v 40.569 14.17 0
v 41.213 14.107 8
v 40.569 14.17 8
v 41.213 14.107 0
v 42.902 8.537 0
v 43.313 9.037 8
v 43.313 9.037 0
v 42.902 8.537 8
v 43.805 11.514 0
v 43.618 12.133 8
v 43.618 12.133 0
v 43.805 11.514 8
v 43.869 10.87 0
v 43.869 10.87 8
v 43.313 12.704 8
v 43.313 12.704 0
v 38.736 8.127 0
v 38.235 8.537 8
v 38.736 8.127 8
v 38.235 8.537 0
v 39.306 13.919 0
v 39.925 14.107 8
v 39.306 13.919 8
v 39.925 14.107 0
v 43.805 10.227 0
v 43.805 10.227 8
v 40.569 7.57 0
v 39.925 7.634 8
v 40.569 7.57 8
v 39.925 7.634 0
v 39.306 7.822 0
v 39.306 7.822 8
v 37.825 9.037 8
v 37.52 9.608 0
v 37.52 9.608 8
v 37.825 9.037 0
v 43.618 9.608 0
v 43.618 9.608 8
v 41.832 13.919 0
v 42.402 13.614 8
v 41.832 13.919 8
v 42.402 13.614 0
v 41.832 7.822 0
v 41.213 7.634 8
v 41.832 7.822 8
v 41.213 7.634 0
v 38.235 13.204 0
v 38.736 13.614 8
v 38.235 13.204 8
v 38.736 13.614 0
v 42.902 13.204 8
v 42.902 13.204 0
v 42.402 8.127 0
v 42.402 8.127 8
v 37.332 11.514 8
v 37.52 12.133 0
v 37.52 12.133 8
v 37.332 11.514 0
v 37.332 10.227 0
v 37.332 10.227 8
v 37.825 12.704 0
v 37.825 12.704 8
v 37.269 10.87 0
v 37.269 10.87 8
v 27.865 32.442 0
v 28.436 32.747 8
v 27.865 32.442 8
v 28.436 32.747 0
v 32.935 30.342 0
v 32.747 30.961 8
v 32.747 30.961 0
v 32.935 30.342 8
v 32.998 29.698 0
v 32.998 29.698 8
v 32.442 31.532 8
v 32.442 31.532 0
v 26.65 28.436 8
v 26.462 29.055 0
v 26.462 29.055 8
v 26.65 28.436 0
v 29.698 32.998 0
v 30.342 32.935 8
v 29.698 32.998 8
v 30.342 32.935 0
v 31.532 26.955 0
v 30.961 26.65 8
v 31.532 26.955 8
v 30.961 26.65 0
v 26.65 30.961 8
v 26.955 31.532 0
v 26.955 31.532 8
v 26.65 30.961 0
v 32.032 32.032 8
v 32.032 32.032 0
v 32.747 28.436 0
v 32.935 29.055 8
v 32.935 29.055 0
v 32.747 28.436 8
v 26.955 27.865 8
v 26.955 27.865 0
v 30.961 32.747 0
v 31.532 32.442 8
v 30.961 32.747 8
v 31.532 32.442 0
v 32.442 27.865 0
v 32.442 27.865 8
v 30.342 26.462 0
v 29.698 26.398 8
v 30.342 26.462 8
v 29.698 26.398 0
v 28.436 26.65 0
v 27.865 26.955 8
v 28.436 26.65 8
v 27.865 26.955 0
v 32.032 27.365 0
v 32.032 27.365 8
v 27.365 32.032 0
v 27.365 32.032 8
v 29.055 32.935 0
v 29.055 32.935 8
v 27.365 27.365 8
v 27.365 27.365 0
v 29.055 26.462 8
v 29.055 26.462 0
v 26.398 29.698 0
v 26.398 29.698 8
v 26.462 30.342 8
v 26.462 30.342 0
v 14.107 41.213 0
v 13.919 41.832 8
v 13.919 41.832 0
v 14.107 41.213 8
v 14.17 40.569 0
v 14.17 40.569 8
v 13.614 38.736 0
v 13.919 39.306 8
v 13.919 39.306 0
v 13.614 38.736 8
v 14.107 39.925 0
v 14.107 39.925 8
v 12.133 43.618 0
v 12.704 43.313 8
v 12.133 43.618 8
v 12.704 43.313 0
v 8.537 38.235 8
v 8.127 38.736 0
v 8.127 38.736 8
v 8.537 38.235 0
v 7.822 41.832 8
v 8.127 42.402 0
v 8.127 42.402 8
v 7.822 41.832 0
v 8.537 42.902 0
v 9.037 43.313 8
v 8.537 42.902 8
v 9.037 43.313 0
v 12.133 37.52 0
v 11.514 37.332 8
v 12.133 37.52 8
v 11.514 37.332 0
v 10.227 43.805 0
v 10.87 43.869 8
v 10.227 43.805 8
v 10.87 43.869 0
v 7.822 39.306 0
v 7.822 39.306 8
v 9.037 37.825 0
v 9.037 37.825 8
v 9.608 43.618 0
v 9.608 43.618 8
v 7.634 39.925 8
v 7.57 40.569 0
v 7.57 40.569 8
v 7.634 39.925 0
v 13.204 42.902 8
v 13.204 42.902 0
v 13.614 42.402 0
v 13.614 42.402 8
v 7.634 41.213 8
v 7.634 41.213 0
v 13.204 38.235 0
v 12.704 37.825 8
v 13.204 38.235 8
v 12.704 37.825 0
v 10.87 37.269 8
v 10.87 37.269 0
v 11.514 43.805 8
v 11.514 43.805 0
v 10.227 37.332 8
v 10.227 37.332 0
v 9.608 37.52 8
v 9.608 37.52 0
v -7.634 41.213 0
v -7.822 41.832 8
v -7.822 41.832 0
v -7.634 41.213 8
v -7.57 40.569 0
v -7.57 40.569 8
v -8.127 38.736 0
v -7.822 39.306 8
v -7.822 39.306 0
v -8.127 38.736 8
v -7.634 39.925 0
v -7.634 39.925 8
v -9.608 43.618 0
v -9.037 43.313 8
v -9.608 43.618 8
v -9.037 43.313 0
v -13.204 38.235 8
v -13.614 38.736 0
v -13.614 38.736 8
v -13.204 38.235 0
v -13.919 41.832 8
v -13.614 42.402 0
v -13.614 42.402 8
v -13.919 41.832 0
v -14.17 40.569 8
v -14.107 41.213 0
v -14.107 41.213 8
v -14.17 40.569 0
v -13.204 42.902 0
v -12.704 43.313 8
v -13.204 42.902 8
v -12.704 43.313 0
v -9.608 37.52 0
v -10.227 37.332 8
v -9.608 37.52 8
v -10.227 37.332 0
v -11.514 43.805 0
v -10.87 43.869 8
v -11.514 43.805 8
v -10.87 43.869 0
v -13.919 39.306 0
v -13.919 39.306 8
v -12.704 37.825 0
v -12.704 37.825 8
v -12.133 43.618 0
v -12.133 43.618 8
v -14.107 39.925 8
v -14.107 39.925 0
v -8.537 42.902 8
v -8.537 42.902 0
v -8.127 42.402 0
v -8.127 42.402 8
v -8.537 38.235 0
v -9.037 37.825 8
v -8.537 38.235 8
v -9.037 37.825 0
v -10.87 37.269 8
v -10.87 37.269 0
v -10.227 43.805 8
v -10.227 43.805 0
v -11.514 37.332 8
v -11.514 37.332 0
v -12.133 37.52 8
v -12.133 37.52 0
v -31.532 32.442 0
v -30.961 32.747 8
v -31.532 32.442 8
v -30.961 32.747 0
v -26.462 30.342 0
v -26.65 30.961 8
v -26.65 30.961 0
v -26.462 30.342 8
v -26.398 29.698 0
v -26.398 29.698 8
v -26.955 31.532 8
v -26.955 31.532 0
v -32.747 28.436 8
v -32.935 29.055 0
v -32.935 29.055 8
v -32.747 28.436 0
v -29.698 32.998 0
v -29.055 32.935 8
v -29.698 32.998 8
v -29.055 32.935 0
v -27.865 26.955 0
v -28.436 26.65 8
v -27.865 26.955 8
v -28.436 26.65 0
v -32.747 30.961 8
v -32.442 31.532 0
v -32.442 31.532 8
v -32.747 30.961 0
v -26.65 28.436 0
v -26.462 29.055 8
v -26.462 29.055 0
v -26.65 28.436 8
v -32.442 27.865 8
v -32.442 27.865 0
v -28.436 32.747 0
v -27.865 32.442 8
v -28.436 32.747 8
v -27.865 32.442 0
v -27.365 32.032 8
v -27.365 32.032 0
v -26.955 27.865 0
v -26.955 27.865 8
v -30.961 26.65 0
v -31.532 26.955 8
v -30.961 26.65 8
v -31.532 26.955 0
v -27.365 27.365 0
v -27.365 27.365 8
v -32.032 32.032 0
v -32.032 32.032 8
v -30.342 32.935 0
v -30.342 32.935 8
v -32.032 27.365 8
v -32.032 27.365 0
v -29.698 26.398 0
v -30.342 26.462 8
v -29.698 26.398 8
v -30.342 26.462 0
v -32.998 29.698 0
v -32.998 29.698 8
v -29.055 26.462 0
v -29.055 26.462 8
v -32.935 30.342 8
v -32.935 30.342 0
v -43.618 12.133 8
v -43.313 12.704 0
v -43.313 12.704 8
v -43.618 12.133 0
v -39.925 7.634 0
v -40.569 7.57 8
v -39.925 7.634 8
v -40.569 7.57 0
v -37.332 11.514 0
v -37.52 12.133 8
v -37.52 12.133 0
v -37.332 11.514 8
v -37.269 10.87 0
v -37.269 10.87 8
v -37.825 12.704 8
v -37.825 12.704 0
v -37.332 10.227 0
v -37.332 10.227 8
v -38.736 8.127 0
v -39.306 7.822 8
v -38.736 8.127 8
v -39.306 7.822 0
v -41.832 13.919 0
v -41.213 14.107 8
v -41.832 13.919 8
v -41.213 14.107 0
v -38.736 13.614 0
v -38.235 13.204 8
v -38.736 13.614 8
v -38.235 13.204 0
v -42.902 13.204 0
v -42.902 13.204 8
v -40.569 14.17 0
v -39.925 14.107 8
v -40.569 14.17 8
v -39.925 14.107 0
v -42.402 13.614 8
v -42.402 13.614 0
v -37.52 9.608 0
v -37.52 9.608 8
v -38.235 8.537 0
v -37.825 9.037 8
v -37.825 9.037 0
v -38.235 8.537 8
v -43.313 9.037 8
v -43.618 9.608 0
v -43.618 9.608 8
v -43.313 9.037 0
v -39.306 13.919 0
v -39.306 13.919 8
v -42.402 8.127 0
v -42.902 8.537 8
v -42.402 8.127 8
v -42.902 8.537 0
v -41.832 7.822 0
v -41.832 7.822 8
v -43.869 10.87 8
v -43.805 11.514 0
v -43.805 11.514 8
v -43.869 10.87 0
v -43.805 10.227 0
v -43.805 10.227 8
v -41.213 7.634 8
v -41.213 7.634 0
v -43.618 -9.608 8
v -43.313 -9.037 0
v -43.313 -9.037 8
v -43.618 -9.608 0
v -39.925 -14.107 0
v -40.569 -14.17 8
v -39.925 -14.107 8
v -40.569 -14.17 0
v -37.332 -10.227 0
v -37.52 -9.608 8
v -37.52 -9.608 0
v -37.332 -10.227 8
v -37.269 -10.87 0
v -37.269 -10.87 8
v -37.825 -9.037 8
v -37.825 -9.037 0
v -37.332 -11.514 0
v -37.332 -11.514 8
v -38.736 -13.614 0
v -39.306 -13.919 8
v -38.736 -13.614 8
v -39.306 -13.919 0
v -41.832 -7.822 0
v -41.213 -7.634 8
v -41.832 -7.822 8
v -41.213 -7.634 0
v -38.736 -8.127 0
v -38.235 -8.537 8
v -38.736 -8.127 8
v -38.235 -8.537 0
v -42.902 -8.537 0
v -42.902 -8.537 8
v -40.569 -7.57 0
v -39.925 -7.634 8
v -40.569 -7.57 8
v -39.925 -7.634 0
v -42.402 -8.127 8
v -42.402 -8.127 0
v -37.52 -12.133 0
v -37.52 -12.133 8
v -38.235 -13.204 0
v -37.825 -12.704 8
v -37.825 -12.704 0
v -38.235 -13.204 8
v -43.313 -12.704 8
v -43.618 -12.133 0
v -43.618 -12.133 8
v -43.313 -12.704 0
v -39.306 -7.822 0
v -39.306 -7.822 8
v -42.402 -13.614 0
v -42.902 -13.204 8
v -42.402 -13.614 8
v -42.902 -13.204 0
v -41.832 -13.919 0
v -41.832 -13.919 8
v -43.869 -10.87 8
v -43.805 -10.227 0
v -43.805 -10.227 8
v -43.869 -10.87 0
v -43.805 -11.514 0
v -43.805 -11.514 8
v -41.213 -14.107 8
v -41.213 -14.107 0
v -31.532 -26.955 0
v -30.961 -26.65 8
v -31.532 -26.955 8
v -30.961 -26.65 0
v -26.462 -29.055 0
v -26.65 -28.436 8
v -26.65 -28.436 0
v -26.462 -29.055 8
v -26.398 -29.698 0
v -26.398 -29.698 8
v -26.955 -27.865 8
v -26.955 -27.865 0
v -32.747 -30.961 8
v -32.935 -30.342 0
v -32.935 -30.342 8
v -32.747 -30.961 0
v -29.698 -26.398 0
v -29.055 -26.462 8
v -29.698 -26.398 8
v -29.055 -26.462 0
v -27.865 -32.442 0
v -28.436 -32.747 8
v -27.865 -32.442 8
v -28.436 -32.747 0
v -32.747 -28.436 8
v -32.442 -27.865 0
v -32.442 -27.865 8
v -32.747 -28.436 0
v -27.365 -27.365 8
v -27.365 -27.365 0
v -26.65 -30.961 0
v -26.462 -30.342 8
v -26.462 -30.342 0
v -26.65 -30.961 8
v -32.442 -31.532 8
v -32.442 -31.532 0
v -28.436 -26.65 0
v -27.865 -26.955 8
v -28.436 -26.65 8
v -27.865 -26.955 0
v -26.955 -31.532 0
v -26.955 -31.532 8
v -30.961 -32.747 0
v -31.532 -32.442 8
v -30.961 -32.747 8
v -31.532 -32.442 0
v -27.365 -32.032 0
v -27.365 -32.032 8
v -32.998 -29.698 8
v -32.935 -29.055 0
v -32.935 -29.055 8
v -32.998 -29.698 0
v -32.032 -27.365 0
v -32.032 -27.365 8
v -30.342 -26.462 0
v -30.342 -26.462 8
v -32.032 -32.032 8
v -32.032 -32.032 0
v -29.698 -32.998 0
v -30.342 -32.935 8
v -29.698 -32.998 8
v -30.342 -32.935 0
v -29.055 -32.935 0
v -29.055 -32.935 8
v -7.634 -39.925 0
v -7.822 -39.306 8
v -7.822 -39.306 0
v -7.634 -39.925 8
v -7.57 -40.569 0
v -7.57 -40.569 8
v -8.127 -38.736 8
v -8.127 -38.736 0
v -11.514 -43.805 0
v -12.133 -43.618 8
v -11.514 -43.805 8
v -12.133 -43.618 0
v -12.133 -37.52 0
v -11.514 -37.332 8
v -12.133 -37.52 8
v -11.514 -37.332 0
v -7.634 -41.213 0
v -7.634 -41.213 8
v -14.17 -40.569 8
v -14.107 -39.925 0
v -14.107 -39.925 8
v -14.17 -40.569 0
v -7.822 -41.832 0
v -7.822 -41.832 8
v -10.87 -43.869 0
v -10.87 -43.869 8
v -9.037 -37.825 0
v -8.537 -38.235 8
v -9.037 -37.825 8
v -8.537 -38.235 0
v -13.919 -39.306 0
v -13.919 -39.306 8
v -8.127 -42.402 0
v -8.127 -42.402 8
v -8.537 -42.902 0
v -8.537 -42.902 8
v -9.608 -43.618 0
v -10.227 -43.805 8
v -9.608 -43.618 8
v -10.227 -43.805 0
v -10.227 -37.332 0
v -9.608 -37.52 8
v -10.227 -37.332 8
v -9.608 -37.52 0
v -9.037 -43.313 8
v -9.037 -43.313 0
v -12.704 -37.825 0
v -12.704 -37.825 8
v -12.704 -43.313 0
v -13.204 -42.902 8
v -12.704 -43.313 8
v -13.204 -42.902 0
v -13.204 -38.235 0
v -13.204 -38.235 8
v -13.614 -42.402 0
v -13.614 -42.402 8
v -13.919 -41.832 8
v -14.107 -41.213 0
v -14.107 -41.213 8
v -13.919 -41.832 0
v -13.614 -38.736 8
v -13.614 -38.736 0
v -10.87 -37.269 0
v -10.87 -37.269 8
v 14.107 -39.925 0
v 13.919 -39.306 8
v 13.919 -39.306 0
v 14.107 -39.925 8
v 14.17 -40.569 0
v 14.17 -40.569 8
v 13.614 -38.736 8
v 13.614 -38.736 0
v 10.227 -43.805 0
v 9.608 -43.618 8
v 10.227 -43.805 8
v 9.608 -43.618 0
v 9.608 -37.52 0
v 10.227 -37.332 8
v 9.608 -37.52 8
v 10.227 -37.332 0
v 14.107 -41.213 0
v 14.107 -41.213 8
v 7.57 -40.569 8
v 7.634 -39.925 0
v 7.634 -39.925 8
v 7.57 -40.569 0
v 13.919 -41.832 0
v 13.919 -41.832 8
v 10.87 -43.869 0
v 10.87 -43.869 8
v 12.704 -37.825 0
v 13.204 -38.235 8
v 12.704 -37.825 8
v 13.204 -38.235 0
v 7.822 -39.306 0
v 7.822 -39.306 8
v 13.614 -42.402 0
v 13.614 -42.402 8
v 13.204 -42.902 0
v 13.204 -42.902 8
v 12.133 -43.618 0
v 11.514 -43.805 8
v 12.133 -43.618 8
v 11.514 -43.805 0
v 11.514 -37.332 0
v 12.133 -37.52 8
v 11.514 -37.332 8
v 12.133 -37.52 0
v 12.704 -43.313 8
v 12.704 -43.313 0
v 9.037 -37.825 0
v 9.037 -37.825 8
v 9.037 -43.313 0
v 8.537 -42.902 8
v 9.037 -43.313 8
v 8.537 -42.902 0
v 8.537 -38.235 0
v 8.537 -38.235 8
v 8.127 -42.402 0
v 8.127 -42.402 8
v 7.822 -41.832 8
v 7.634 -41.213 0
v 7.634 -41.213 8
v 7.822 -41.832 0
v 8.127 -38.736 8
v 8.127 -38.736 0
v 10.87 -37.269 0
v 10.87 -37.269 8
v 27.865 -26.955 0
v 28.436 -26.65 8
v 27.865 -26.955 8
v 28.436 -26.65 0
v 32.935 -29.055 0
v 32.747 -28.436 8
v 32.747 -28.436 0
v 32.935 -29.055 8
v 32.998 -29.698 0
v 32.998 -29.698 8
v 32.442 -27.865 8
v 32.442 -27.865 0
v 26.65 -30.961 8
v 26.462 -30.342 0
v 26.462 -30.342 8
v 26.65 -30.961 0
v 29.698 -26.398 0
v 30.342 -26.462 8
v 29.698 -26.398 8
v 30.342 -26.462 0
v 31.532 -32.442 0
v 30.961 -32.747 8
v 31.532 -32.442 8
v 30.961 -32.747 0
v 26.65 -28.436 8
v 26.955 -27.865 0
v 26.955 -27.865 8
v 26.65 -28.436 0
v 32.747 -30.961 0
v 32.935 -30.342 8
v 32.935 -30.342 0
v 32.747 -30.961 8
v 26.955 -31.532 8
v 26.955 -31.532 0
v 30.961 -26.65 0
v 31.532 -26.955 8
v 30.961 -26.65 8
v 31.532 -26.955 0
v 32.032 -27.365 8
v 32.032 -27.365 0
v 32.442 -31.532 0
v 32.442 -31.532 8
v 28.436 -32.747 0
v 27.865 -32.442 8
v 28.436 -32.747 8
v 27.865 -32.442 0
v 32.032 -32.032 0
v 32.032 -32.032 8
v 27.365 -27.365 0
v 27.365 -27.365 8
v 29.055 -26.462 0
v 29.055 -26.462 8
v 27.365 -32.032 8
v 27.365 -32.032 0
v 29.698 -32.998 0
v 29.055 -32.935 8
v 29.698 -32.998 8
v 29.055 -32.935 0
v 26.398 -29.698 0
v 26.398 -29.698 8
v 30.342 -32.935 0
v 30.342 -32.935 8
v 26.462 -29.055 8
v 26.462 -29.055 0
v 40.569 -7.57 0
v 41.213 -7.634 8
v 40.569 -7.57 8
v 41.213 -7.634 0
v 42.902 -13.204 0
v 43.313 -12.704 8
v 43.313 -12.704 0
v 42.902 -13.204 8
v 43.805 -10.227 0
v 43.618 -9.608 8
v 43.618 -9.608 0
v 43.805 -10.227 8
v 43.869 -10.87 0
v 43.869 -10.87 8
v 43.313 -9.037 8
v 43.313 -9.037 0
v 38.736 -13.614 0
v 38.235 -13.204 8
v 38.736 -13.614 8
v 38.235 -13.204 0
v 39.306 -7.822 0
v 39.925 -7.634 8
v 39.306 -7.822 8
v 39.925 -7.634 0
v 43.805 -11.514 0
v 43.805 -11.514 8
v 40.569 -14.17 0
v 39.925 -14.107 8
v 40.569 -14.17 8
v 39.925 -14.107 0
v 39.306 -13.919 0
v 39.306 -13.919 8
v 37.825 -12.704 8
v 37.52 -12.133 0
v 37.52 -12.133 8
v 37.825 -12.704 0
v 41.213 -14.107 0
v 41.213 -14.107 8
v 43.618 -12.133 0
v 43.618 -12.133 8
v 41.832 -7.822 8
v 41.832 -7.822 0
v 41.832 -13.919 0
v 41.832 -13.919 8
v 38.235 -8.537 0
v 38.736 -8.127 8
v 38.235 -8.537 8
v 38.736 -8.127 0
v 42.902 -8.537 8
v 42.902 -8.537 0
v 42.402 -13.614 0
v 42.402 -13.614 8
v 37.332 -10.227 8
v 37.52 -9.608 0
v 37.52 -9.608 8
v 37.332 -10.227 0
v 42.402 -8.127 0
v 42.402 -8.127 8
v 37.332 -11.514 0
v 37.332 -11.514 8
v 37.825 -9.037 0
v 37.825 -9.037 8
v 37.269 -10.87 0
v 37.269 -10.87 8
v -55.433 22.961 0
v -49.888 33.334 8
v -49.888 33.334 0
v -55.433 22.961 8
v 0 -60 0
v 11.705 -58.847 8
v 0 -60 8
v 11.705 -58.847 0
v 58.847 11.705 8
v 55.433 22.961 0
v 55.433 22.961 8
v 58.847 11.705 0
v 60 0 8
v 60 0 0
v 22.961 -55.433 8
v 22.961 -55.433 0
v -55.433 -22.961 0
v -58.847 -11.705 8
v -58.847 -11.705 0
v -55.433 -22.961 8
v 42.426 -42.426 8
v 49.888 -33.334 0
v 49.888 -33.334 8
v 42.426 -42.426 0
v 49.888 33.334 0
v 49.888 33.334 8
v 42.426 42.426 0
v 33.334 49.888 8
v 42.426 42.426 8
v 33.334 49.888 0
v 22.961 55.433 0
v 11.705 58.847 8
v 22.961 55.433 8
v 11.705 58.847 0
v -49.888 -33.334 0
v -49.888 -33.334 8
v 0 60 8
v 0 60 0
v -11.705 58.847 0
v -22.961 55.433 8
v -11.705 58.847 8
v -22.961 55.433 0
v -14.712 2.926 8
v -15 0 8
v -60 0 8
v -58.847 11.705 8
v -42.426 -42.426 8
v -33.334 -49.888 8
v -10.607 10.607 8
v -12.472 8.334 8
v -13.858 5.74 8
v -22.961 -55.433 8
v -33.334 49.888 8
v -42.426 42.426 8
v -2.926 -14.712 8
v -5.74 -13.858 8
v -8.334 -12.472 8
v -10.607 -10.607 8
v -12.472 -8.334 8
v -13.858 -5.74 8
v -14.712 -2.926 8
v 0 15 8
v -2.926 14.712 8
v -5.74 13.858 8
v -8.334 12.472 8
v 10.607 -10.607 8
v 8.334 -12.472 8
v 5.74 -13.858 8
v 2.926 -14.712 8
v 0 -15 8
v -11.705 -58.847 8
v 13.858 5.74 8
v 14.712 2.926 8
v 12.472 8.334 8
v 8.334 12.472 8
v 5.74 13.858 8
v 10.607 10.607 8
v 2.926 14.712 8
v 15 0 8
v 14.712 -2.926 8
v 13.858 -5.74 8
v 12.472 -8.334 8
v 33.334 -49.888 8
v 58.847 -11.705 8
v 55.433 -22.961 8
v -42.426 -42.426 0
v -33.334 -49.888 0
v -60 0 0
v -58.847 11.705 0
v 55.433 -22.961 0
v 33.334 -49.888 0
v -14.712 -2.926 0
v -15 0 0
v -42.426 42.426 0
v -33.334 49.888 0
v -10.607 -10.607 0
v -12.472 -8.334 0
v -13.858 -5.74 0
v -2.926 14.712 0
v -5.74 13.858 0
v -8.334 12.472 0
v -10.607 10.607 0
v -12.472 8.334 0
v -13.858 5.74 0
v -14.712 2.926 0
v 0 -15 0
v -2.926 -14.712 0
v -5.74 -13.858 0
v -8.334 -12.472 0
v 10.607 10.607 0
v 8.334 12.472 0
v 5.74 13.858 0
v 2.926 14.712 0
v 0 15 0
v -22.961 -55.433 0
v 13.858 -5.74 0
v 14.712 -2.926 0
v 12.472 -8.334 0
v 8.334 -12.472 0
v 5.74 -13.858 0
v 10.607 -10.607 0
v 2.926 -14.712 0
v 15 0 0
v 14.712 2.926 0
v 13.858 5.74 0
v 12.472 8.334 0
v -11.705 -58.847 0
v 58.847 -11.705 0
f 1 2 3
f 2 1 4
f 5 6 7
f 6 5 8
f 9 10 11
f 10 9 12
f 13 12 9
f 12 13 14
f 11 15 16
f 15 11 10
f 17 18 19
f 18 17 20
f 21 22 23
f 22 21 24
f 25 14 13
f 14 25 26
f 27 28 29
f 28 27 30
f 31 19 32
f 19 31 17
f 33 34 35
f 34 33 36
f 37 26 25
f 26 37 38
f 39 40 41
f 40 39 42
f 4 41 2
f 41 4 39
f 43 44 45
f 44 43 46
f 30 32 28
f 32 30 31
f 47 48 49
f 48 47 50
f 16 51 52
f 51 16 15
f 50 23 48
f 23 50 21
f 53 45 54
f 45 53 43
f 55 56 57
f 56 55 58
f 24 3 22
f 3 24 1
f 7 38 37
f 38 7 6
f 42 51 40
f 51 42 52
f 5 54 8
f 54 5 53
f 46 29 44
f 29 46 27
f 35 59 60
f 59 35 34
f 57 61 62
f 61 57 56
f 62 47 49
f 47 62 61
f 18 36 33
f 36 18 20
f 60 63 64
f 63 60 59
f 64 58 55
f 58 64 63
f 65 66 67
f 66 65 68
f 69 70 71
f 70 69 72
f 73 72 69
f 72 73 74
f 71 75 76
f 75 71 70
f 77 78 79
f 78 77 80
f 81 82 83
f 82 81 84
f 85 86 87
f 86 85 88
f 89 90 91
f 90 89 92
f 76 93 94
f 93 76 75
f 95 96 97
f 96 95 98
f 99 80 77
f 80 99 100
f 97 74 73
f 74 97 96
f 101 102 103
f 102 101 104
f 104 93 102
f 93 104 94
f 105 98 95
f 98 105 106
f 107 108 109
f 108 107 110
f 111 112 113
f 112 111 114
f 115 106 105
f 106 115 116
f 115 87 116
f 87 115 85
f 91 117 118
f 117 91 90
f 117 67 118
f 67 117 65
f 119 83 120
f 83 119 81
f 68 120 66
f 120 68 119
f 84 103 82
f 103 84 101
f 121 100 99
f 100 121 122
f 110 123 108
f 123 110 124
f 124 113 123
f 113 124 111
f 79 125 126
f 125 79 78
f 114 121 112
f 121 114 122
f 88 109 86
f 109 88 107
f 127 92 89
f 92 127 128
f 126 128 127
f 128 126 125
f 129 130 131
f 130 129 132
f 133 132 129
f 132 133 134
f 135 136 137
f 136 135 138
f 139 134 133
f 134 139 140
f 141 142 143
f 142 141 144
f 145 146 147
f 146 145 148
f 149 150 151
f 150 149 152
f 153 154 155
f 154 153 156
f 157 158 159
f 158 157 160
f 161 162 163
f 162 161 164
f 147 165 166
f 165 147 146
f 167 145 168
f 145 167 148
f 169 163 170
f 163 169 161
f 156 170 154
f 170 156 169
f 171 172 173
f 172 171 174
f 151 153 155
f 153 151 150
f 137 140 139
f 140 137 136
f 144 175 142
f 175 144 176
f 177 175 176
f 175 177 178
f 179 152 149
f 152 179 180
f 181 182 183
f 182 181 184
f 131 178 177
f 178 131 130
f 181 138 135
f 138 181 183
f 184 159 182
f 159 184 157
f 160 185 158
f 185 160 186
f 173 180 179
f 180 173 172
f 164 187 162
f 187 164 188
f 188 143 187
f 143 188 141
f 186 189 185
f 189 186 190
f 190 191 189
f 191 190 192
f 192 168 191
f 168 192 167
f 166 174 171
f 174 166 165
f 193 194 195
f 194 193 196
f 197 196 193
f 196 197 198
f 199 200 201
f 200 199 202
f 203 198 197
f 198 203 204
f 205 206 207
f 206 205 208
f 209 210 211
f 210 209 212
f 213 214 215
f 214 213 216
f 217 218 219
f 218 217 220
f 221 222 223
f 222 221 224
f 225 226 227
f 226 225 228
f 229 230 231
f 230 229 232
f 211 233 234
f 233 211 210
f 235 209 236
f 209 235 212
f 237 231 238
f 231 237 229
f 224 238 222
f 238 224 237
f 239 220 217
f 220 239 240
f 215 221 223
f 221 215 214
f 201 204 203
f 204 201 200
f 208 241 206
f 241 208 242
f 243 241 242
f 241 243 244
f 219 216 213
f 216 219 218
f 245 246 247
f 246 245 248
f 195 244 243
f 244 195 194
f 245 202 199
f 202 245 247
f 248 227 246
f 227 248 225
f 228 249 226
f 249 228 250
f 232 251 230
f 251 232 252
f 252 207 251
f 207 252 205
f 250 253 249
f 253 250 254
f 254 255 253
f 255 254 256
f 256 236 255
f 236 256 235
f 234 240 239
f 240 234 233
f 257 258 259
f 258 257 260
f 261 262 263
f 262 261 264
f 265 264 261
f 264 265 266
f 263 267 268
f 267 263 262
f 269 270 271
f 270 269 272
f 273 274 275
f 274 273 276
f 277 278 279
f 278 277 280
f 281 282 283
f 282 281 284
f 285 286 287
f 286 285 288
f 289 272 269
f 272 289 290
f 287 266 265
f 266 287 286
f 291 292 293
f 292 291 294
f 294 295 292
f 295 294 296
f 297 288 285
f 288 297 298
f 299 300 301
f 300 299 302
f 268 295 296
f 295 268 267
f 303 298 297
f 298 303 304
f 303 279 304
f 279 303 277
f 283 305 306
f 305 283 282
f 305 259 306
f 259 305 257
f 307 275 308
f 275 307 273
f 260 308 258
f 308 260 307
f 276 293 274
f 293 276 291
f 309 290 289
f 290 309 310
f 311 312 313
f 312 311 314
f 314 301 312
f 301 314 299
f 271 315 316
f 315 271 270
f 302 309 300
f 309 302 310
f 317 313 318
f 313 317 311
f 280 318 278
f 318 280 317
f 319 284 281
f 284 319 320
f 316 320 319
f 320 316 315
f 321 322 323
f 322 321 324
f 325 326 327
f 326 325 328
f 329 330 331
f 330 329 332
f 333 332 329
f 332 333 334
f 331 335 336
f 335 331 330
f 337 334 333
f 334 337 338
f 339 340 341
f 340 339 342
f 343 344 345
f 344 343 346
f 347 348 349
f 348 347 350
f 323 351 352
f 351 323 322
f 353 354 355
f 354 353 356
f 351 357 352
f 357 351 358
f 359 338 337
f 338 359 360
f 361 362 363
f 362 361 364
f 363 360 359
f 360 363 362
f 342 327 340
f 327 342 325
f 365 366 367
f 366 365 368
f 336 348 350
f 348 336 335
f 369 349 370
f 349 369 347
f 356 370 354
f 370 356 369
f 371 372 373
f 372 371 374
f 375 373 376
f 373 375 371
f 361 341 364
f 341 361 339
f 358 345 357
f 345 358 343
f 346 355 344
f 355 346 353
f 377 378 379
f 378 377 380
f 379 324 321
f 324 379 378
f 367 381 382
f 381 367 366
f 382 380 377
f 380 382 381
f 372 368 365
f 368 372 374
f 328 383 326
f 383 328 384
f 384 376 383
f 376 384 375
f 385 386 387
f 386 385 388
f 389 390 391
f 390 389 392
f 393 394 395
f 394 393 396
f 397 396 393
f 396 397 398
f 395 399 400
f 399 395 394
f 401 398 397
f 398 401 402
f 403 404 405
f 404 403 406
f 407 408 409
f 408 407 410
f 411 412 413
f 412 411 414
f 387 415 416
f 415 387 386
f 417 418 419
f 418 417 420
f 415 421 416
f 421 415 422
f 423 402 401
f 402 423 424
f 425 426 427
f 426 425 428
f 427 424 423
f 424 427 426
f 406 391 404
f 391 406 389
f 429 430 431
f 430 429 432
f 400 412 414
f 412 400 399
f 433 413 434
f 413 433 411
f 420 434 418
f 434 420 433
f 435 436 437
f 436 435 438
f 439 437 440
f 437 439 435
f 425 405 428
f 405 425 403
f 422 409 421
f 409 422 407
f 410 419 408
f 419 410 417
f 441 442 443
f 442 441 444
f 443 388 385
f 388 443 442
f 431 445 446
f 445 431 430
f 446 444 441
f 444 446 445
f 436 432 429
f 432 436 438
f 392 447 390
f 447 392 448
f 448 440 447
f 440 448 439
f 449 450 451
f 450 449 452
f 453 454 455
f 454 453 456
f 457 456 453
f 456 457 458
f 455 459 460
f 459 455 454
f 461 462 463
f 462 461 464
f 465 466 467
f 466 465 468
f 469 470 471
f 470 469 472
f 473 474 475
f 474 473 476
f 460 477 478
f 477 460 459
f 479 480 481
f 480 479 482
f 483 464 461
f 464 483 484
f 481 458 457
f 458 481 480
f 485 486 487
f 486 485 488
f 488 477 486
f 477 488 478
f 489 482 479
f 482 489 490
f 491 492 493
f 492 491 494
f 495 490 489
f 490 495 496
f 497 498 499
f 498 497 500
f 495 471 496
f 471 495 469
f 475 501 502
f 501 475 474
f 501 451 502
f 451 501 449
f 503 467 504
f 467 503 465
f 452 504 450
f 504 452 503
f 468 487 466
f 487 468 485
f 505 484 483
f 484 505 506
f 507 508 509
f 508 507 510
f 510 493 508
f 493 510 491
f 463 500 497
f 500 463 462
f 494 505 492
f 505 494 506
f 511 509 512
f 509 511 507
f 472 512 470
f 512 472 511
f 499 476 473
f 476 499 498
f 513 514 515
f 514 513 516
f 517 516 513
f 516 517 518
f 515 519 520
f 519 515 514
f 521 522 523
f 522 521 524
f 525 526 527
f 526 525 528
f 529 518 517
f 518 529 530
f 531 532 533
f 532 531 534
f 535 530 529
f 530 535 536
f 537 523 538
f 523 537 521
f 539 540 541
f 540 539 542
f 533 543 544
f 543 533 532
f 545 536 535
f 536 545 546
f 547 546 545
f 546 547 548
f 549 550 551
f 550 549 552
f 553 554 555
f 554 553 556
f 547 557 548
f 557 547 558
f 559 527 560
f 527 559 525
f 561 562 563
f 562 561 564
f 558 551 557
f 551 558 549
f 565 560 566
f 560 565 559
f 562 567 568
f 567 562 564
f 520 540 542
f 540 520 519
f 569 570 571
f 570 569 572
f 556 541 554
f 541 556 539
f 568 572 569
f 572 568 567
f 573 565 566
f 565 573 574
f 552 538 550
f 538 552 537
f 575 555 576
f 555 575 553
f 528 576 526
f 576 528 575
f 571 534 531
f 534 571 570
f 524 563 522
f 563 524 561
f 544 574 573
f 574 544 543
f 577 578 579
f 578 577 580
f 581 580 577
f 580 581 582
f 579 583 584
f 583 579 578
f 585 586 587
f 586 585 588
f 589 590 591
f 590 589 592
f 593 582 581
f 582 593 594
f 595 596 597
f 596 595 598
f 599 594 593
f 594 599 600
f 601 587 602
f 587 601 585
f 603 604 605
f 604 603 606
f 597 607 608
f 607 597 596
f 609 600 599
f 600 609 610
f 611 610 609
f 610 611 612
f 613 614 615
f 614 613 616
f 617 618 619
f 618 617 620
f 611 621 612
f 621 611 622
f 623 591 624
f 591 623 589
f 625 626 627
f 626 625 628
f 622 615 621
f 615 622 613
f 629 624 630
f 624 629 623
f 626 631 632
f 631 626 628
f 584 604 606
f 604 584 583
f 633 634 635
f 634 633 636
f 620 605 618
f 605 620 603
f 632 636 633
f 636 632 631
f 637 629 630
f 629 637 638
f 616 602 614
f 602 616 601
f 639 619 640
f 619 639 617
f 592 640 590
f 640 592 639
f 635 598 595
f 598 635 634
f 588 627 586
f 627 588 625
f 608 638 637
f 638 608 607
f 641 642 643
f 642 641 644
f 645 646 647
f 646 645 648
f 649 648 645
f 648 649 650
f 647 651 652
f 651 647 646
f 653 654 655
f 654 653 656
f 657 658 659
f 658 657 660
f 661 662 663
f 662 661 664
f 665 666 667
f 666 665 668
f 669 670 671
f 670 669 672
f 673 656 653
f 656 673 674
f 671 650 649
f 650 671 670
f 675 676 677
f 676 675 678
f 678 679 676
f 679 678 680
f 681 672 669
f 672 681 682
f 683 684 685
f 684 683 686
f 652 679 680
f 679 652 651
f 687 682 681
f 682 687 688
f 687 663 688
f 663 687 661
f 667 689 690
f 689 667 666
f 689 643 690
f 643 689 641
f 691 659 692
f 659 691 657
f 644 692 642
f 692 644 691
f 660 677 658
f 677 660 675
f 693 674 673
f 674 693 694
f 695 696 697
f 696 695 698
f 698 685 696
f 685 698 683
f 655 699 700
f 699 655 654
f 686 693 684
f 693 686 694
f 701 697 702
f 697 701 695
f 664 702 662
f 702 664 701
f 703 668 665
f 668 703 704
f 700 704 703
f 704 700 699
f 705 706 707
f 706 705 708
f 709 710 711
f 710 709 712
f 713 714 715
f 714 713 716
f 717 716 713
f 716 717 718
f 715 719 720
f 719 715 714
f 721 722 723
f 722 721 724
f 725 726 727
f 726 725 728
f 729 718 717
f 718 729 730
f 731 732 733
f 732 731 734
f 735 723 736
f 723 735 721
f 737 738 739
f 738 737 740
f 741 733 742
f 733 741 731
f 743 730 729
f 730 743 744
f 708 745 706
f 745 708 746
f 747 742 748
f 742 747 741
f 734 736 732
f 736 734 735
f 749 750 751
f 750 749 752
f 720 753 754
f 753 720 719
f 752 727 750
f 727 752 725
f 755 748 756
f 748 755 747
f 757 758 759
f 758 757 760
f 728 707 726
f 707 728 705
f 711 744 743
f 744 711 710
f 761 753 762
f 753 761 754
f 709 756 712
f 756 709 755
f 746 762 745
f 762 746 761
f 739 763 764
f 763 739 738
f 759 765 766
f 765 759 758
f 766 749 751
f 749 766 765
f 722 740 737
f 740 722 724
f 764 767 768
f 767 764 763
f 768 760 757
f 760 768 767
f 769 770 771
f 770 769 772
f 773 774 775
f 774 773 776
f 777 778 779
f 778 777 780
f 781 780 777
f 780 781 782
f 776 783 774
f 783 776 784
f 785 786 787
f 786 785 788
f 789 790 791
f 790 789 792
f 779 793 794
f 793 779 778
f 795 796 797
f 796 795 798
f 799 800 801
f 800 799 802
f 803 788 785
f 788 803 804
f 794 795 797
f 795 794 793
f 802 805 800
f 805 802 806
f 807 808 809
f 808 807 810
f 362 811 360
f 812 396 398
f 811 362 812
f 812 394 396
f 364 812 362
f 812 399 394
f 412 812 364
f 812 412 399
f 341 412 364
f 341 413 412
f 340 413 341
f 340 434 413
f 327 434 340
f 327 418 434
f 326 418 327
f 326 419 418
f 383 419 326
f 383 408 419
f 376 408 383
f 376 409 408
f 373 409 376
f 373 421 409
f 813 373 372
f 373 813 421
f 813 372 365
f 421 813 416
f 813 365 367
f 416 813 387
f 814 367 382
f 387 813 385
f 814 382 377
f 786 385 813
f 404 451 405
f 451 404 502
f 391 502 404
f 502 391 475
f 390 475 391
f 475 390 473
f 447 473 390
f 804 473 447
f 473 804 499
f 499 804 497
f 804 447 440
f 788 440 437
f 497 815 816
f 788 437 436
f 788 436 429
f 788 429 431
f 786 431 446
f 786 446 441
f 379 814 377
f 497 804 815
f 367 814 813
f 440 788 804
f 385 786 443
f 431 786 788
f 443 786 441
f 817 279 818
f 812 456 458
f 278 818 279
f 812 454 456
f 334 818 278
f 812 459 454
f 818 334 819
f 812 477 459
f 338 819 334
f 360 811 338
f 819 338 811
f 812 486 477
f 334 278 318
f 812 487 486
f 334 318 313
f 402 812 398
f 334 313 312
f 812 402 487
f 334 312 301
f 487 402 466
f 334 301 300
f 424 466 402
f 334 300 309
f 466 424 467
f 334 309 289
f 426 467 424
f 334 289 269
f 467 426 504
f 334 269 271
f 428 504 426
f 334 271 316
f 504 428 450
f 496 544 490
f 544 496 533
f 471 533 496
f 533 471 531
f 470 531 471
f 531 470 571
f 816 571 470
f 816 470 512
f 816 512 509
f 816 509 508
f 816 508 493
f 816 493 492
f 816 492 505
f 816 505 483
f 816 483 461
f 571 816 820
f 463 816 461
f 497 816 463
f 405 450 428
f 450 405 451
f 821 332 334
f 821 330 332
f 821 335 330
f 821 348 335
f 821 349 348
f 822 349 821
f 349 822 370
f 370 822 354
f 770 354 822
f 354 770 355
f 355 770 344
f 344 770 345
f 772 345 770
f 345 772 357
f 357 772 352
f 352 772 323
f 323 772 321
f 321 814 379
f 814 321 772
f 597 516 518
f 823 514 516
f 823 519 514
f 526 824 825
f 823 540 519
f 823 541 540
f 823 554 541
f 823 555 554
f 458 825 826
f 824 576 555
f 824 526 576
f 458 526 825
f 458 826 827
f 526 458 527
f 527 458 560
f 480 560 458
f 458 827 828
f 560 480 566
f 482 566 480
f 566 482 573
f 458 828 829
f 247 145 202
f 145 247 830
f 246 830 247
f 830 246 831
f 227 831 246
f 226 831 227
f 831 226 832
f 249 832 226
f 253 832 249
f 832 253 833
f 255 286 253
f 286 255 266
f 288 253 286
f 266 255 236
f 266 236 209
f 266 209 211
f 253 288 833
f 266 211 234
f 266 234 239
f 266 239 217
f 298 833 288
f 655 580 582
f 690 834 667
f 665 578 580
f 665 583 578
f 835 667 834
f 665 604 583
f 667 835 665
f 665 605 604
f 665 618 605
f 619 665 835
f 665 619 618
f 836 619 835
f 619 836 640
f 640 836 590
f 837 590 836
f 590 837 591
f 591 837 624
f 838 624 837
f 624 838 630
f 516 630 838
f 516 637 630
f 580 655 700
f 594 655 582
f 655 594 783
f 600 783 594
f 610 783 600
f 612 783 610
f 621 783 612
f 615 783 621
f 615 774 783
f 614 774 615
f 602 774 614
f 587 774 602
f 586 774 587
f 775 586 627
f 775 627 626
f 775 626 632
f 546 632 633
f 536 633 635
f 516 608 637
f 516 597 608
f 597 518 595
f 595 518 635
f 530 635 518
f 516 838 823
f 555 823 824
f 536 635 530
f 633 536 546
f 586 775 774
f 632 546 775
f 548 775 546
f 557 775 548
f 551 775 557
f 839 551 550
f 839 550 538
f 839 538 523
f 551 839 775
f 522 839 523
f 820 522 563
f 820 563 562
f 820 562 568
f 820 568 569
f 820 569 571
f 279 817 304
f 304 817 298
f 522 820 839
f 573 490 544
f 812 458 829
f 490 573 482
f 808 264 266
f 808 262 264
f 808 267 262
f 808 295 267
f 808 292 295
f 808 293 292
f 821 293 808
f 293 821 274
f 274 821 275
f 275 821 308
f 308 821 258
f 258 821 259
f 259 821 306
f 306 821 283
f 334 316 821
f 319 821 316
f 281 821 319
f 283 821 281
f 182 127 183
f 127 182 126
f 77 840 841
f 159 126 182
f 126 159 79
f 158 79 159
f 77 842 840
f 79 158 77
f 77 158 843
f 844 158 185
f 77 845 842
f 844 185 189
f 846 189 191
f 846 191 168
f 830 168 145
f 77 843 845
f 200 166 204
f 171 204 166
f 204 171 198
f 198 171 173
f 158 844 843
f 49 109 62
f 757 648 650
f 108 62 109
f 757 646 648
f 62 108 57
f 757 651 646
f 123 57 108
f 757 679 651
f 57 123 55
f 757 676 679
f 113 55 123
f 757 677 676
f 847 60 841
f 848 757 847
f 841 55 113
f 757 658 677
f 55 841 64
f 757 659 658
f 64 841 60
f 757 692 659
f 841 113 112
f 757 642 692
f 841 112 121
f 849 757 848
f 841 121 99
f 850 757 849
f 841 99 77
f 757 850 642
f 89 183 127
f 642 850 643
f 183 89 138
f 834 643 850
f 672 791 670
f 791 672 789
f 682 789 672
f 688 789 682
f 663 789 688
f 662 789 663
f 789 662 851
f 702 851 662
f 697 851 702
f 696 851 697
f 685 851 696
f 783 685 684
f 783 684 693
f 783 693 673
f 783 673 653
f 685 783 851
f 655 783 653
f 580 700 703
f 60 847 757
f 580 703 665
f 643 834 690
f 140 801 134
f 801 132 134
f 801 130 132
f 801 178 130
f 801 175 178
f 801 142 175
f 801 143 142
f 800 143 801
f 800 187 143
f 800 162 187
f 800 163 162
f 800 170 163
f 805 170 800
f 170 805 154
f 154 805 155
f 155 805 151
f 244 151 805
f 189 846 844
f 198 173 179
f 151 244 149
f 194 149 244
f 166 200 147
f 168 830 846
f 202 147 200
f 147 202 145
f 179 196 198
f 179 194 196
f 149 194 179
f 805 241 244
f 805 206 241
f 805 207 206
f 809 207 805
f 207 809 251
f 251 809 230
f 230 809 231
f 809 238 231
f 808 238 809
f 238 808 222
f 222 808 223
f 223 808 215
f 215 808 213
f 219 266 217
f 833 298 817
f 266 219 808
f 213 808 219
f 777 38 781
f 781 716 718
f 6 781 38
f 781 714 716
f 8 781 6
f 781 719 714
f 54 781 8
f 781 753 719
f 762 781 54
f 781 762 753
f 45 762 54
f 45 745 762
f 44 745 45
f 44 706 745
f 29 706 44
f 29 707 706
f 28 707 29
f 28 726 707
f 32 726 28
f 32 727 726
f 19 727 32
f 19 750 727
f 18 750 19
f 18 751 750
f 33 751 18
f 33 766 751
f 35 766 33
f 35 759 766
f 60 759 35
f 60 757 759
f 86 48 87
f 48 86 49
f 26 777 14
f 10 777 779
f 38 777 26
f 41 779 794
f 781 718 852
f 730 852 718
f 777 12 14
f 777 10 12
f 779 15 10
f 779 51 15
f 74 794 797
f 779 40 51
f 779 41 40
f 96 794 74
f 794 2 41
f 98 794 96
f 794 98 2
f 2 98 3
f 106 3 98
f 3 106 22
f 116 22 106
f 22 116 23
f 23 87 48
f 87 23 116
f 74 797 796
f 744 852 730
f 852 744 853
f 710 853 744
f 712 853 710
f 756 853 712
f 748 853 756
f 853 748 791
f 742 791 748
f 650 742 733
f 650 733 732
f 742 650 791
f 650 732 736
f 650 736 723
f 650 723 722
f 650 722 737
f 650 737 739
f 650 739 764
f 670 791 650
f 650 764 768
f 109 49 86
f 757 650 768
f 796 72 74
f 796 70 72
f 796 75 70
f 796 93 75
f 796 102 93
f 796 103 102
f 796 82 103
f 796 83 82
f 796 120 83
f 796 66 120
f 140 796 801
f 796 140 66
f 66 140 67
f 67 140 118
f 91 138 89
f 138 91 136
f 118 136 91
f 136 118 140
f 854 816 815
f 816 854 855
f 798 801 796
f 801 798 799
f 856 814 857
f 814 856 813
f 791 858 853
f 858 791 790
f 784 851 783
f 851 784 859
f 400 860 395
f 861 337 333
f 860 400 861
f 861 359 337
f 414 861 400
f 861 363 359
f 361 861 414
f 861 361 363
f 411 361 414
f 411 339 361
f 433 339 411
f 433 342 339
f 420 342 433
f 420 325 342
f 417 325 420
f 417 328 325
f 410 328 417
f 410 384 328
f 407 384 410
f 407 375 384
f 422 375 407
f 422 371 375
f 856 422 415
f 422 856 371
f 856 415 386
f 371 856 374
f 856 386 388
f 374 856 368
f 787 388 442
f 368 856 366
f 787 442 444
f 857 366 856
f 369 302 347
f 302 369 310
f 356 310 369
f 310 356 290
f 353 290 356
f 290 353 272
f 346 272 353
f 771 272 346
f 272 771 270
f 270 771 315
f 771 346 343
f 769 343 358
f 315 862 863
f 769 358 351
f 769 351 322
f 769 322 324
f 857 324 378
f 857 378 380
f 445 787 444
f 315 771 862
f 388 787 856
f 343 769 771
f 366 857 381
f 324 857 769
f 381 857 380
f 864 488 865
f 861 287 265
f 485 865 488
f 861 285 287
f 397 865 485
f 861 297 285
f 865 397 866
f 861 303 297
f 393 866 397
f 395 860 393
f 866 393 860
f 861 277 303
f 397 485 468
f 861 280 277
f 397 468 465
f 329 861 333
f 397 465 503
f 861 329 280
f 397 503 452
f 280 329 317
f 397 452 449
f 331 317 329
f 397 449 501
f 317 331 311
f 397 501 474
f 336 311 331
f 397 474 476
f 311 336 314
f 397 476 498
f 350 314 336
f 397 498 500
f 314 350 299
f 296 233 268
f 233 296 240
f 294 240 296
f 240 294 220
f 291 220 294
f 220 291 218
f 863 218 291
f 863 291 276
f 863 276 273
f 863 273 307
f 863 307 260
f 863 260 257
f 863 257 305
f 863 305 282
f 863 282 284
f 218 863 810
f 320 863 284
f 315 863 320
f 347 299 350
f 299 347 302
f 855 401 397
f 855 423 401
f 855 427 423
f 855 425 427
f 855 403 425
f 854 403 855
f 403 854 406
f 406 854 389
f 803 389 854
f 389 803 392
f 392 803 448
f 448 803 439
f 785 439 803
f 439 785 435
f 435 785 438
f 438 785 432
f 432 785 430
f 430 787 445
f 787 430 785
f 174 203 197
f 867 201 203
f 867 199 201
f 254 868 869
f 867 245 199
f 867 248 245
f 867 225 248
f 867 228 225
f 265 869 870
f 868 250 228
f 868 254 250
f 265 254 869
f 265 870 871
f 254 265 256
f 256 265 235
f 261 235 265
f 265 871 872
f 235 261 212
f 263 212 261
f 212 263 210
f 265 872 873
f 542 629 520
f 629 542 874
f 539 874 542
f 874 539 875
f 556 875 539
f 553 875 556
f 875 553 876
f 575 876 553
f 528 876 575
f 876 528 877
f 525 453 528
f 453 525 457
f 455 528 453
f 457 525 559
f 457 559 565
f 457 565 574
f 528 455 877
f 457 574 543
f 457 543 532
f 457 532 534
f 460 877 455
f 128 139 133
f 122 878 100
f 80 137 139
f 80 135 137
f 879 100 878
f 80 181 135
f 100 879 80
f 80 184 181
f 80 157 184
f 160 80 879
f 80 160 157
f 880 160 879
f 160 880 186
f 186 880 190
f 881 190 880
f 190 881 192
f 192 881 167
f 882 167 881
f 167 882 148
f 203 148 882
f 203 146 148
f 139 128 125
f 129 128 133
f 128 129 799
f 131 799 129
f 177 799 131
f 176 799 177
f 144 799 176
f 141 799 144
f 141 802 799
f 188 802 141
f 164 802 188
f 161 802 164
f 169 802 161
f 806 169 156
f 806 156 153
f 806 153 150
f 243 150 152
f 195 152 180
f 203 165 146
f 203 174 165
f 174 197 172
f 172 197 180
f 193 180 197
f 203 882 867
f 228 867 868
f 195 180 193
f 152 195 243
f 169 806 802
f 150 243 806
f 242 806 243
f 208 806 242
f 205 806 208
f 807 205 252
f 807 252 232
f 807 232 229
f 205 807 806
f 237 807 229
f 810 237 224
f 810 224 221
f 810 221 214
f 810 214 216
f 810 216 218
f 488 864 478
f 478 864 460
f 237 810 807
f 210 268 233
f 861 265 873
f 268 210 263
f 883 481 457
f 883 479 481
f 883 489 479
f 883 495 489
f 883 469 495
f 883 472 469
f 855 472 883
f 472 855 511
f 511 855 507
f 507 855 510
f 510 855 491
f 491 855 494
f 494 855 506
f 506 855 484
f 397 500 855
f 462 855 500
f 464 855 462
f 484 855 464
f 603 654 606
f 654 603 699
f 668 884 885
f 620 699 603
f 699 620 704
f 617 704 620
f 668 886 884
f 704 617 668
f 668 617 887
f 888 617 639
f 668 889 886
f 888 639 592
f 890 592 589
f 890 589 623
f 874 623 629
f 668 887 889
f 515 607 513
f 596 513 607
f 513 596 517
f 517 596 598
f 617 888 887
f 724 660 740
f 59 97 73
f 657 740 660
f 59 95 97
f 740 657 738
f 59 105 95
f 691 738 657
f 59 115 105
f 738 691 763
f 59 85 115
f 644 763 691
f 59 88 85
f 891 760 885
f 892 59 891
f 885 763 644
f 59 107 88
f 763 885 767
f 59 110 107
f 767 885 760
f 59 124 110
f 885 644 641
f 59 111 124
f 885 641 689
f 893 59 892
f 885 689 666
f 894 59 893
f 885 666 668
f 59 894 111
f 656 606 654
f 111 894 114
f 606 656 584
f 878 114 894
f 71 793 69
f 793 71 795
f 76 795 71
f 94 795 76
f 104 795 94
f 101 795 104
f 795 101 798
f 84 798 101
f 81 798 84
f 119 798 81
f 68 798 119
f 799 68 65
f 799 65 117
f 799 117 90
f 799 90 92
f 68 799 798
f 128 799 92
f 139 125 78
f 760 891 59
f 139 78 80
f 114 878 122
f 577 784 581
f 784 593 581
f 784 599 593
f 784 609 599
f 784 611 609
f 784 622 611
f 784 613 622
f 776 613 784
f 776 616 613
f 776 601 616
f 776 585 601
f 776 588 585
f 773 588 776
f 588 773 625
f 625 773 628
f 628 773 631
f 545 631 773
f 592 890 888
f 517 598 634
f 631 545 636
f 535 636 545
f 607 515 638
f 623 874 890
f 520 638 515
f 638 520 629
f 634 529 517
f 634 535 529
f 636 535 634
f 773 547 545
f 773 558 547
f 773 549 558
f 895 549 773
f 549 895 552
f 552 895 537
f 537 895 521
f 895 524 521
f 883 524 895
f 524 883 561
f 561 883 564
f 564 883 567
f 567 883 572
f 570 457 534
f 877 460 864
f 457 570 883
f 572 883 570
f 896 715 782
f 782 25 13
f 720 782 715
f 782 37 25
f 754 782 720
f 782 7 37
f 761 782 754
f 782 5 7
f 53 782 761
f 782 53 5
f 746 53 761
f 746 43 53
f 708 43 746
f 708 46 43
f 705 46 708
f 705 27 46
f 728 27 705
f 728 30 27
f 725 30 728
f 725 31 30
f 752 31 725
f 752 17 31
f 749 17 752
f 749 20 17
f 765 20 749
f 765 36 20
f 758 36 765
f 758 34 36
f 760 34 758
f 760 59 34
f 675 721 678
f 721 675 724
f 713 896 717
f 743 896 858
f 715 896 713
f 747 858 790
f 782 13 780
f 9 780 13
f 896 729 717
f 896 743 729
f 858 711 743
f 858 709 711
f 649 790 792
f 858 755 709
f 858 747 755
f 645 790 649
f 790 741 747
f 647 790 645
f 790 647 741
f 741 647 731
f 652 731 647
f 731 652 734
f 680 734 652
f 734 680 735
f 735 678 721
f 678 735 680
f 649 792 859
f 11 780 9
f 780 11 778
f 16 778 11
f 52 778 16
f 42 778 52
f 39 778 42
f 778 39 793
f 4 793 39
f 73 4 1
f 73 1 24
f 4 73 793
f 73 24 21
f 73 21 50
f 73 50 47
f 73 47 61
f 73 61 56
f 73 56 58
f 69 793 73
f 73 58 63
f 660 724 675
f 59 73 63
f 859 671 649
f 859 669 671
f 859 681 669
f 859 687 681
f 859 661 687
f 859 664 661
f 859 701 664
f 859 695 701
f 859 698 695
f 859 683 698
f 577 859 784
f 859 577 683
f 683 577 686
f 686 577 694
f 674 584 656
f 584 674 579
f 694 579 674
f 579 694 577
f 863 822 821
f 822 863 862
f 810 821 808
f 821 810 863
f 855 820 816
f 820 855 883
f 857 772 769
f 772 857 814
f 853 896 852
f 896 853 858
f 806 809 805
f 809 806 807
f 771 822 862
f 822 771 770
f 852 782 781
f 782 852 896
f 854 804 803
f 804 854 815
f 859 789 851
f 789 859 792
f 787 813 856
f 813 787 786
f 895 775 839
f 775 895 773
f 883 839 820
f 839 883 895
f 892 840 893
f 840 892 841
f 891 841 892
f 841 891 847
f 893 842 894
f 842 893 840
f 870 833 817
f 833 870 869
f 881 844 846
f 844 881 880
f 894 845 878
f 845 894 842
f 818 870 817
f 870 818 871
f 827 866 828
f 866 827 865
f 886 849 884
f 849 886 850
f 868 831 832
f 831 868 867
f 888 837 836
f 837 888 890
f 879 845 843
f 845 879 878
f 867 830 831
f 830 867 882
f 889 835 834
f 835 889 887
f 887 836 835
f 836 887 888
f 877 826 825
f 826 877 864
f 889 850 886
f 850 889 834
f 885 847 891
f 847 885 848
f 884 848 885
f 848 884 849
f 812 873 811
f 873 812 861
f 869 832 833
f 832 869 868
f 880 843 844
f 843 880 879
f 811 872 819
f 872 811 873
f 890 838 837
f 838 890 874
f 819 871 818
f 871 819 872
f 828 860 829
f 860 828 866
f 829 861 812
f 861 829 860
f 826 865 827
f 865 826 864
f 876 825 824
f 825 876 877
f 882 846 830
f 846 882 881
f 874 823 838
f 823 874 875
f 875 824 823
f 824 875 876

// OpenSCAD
$fn = 32;

// ----------------------------------------------------------------------
// Flange Ø120 x 8
// 12 holes on a Ø84 bolt circle, bolted joints
// ----------------------------------------------------------------------

// --- parameters (mm) ---
flange_d = 120;  // outside diameter of the flange
thickness = 8;   // flange thickness
holes = 12;      // number of bolt holes
pcd = 84;        // bolt circle diameter
start_deg = 15;  // angle of the first hole, from +X
hole_d = 6.6;    // bolt hole diameter
bore_d = 30;     // central through bore
hub_d = 40;      // hub outside diameter
hub_h = 0;       // hub height above the flange face (0 = no hub)

// --- derived feature positions (mm) ---
height = thickness + hub_h;  // = 8   overall height of the part
pcd_r = pcd / 2;             // = 42   bolt circle radius
hole_step = 360 / holes;     // = 30   angular pitch
feature_centers = [
  [pcd_r * cos(start_deg + 0 * hole_step), pcd_r * sin(start_deg + 0 * hole_step)],
  [pcd_r * cos(start_deg + 1 * hole_step), pcd_r * sin(start_deg + 1 * hole_step)],
  [pcd_r * cos(start_deg + 2 * hole_step), pcd_r * sin(start_deg + 2 * hole_step)],
  [pcd_r * cos(start_deg + 3 * hole_step), pcd_r * sin(start_deg + 3 * hole_step)],
  [pcd_r * cos(start_deg + 4 * hole_step), pcd_r * sin(start_deg + 4 * hole_step)],
  [pcd_r * cos(start_deg + 5 * hole_step), pcd_r * sin(start_deg + 5 * hole_step)],
  [pcd_r * cos(start_deg + 6 * hole_step), pcd_r * sin(start_deg + 6 * hole_step)],
  [pcd_r * cos(start_deg + 7 * hole_step), pcd_r * sin(start_deg + 7 * hole_step)],
  [pcd_r * cos(start_deg + 8 * hole_step), pcd_r * sin(start_deg + 8 * hole_step)],
  [pcd_r * cos(start_deg + 9 * hole_step), pcd_r * sin(start_deg + 9 * hole_step)],
  [pcd_r * cos(start_deg + 10 * hole_step), pcd_r * sin(start_deg + 10 * hole_step)],
  [pcd_r * cos(start_deg + 11 * hole_step), pcd_r * sin(start_deg + 11 * hole_step)]
];   // bolt hole centres on the pitch circle

// flange disc, every hole and the bore cut straight through
difference() {
  union() {
    cylinder(d = flange_d, h = thickness);
  }
  translate([0, 0, -1]) cylinder(d = bore_d, h = height + 2);  // bore, through
  for (centre = feature_centers)
    translate([centre[0], centre[1], -1]) cylinder(d = hole_d, h = thickness + 2);
}
